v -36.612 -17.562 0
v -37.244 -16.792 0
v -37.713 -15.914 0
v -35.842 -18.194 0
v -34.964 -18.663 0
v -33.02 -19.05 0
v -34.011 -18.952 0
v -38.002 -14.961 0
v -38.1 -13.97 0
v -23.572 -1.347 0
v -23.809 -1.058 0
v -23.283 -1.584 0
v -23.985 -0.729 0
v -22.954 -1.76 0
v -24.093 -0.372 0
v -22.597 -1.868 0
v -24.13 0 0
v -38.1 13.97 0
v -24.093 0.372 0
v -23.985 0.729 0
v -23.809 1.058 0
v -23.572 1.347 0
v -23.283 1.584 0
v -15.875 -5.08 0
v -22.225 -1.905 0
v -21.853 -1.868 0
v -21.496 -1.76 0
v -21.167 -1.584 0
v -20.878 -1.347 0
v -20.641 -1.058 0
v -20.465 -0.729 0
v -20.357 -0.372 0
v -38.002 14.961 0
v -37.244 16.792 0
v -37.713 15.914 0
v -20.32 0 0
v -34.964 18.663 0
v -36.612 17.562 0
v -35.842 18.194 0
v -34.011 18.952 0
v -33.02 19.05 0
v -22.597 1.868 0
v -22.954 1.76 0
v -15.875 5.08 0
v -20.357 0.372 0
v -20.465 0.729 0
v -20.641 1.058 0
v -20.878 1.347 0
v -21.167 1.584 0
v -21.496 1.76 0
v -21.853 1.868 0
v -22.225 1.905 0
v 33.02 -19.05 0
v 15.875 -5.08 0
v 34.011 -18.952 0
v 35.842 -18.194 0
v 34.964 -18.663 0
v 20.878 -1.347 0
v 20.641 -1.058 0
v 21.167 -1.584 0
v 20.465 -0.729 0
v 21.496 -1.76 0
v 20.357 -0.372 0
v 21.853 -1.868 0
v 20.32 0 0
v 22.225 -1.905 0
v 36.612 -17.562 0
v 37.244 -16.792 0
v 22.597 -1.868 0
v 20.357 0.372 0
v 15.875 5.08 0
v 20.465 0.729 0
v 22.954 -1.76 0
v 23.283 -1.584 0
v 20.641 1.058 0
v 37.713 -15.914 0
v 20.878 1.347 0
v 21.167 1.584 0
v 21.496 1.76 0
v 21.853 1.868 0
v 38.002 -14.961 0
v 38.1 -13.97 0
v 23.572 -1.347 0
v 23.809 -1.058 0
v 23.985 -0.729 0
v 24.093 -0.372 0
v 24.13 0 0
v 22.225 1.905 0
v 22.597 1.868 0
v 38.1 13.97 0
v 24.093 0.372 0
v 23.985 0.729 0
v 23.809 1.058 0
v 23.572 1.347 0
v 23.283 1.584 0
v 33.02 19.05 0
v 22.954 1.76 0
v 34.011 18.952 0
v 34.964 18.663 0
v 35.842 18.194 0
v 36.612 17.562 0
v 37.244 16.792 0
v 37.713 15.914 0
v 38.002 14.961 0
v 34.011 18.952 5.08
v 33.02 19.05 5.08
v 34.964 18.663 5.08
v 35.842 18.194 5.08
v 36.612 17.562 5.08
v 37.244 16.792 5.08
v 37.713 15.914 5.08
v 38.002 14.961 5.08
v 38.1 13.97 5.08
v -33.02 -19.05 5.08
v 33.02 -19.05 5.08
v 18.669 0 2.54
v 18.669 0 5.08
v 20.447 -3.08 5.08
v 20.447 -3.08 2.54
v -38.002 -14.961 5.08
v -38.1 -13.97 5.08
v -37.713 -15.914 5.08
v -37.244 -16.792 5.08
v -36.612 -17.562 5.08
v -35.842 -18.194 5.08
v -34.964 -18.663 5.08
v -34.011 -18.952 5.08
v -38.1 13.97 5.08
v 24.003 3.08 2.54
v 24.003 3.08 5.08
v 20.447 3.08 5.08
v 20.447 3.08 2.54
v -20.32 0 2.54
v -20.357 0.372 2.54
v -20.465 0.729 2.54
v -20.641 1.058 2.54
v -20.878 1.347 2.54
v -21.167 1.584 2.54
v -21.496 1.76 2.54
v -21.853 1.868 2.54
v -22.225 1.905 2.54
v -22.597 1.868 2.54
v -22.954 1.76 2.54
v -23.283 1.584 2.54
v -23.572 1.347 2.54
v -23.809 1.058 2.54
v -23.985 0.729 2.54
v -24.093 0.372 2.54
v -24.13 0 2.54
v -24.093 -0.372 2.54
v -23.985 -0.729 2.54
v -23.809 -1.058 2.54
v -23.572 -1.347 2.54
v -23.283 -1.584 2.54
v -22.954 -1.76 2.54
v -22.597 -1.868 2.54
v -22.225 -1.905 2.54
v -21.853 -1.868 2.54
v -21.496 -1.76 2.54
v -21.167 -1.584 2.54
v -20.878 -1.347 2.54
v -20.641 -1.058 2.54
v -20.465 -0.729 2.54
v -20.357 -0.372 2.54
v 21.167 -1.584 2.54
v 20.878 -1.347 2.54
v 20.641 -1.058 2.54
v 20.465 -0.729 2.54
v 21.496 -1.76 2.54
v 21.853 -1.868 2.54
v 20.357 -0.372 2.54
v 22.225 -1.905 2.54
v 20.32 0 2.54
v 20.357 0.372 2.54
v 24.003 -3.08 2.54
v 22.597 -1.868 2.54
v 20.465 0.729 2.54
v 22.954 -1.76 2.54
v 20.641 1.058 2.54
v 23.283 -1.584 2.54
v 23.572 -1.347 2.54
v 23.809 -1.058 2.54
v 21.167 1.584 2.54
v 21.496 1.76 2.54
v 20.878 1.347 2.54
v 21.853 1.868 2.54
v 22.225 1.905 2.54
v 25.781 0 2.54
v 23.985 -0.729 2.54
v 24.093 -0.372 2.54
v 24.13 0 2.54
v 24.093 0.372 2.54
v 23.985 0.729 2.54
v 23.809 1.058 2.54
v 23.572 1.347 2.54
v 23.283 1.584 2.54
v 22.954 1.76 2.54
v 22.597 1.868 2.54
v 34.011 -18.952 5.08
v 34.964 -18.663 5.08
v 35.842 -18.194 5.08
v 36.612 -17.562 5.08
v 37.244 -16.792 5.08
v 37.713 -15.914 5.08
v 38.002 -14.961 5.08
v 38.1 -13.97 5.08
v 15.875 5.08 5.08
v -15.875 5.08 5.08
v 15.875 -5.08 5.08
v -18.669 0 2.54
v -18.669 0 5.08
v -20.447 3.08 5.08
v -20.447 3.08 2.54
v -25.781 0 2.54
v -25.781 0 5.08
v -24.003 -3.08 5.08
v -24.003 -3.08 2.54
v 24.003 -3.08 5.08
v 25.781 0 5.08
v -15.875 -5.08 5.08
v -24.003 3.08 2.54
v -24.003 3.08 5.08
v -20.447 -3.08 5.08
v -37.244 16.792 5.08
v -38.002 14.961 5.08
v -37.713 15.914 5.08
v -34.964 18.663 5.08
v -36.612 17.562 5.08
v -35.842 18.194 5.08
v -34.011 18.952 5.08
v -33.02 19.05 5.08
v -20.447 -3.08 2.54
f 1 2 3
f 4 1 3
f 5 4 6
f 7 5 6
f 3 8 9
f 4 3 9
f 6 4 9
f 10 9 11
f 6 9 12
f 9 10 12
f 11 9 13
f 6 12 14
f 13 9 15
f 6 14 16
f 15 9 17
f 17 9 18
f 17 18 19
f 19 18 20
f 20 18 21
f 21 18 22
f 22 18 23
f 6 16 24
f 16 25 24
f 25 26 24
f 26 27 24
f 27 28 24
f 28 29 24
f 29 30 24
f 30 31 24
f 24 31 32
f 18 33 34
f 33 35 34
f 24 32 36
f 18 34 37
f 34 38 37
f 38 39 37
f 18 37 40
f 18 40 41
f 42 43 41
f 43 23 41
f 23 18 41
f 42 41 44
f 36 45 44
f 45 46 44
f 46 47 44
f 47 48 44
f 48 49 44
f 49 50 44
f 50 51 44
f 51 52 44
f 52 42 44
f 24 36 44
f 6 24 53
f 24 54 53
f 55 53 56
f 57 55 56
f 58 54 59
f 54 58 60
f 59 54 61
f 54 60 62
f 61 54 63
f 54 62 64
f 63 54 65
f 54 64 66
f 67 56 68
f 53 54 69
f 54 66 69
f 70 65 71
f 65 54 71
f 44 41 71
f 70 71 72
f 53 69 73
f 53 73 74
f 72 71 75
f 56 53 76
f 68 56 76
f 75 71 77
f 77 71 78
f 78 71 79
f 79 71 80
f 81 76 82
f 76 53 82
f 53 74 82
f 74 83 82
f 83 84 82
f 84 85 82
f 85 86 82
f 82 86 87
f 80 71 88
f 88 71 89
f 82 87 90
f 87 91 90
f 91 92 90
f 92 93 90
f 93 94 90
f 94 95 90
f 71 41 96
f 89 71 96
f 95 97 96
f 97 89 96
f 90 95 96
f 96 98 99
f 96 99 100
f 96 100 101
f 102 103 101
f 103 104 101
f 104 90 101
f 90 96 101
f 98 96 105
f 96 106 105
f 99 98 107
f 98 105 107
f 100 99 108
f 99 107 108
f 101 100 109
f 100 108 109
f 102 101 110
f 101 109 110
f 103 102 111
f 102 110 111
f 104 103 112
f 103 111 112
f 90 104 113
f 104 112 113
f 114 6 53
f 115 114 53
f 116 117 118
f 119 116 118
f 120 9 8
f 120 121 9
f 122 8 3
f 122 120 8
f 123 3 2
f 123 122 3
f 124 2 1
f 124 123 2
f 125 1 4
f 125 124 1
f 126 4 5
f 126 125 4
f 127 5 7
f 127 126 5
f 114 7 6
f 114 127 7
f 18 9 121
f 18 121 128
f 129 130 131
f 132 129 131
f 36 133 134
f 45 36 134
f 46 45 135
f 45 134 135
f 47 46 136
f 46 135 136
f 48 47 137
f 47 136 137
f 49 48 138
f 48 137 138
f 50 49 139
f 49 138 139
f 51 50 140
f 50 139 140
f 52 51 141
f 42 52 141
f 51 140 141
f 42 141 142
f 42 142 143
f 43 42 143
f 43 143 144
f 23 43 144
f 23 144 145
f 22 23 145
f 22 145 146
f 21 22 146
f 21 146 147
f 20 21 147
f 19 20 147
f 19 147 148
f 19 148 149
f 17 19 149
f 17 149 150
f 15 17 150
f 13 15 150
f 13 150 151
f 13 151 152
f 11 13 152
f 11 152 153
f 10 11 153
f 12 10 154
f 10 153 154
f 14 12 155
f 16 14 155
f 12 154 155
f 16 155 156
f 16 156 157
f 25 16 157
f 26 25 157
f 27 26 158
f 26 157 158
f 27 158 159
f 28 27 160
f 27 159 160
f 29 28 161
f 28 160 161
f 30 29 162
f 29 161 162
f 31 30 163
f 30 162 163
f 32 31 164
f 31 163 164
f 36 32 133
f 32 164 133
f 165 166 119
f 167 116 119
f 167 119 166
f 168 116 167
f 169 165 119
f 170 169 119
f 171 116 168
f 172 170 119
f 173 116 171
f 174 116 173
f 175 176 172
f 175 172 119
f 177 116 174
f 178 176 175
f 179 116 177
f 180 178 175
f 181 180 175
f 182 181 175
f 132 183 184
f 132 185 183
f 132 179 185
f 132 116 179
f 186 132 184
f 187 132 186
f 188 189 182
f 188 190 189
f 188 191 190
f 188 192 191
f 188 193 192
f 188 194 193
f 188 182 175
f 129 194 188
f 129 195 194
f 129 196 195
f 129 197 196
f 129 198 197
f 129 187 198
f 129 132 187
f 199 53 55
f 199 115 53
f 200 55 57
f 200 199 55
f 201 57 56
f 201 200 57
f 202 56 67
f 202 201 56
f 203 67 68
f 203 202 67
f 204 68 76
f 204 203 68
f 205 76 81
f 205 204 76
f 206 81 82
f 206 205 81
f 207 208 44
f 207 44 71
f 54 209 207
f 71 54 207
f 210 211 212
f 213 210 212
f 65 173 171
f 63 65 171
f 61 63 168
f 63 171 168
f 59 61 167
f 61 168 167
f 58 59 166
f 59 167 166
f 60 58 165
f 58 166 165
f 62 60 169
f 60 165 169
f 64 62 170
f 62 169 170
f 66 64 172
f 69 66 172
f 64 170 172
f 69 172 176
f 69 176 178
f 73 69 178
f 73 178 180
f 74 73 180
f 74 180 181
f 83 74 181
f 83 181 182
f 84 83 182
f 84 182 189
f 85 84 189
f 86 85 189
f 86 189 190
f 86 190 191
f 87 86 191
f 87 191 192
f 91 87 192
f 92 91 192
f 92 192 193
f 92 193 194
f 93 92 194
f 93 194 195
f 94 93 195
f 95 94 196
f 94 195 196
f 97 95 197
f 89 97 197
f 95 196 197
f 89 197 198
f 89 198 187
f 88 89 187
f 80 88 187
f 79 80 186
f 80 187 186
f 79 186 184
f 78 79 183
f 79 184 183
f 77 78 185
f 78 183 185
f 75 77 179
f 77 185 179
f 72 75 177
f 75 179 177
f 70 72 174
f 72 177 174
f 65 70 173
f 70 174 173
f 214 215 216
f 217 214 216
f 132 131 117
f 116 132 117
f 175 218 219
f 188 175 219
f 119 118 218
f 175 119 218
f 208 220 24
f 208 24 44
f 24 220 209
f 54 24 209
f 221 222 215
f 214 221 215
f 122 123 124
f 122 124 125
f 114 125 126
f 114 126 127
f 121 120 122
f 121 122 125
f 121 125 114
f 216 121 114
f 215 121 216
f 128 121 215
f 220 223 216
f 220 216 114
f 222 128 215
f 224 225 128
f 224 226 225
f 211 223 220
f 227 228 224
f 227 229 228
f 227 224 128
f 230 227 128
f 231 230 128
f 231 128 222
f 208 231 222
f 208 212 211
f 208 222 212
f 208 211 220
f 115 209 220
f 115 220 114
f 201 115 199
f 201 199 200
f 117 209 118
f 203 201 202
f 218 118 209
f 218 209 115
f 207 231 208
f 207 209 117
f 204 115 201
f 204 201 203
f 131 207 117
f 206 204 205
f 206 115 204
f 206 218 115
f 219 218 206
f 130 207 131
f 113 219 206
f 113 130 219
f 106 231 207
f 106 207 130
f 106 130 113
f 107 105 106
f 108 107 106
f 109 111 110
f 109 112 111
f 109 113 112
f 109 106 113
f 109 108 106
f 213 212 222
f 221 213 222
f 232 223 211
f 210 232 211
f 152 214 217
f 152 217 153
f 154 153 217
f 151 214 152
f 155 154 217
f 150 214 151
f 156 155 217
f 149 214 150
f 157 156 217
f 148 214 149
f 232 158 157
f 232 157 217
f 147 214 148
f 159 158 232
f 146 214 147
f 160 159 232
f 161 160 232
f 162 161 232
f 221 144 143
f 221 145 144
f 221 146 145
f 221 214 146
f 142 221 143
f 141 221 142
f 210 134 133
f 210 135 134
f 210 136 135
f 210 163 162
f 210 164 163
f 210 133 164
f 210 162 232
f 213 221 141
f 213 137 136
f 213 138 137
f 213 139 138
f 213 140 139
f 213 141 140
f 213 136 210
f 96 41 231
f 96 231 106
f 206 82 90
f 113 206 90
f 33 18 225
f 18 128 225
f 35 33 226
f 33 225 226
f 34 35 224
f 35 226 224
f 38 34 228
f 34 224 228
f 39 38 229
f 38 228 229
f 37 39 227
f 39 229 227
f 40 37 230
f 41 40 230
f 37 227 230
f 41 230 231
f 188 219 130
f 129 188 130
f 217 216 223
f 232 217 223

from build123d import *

# Parameters (mm, degrees)
F0_W     = 76.2
F0_H     = 38.1
F1_DEPTH = 5.08
F2_W     = 31.75
F2_H     = 10.16
F3_DEPTH = 5.08
F4_R     = 1.905
F5_DEPTH = 5.08
F7_DEPTH = 2.54
F8_R     = 5.08


with BuildPart() as f1:
    # F0 (on Top) → F1 (new body)
    with BuildSketch(Plane.XY):
        Rectangle(F0_W, F0_H)
    extrude(amount=F1_DEPTH)

    # F2 (on face) → F3 (cut, through all)
    with BuildSketch(Plane.XY.offset(5.08)):
        Rectangle(F2_W, F2_H)
    extrude(amount=-F3_DEPTH, mode=Mode.SUBTRACT)

    # F4 (on face) → F5 (cut, through all)
    with BuildSketch(Plane.XY.offset(5.08)):
        with Locations((-22.225, 0)):
            Circle(F4_R)
        with BuildLine():
            ThreePointArc((24.13, 0), (22.225, 1.905), (20.32, 0))
            ThreePointArc((20.32, 0), (22.225, -1.905), (24.13, 0))
        make_face()
    extrude(amount=-F5_DEPTH, mode=Mode.SUBTRACT)

    # F6 (on face) → F7 (cut)
    with BuildSketch(Plane.XY.offset(5.08)):
        Polygon((-18.669, 0), (-20.447, 3.079586), (-24.003, 3.079586), (-25.781, 0), (-24.003, -3.079586), (-20.447, -3.079586), align=None)
        Polygon((25.781, 0), (24.003, 3.079586), (20.447, 3.079586), (18.669, 0), (20.447, -3.079586), (24.003, -3.079586), align=None)
    extrude(amount=-F7_DEPTH, mode=Mode.SUBTRACT)

    # F8
    f8_edges = [f1.edges().sort_by_distance(p)[0] for p in [
        (38.1, -19.05, 2.54),
        (38.1, 19.05, 2.54),
        (-38.1, 19.05, 2.54),
        (-38.1, -19.05, 2.54),
    ]]
    fillet(f8_edges, radius=F8_R)


solid = f1.part
